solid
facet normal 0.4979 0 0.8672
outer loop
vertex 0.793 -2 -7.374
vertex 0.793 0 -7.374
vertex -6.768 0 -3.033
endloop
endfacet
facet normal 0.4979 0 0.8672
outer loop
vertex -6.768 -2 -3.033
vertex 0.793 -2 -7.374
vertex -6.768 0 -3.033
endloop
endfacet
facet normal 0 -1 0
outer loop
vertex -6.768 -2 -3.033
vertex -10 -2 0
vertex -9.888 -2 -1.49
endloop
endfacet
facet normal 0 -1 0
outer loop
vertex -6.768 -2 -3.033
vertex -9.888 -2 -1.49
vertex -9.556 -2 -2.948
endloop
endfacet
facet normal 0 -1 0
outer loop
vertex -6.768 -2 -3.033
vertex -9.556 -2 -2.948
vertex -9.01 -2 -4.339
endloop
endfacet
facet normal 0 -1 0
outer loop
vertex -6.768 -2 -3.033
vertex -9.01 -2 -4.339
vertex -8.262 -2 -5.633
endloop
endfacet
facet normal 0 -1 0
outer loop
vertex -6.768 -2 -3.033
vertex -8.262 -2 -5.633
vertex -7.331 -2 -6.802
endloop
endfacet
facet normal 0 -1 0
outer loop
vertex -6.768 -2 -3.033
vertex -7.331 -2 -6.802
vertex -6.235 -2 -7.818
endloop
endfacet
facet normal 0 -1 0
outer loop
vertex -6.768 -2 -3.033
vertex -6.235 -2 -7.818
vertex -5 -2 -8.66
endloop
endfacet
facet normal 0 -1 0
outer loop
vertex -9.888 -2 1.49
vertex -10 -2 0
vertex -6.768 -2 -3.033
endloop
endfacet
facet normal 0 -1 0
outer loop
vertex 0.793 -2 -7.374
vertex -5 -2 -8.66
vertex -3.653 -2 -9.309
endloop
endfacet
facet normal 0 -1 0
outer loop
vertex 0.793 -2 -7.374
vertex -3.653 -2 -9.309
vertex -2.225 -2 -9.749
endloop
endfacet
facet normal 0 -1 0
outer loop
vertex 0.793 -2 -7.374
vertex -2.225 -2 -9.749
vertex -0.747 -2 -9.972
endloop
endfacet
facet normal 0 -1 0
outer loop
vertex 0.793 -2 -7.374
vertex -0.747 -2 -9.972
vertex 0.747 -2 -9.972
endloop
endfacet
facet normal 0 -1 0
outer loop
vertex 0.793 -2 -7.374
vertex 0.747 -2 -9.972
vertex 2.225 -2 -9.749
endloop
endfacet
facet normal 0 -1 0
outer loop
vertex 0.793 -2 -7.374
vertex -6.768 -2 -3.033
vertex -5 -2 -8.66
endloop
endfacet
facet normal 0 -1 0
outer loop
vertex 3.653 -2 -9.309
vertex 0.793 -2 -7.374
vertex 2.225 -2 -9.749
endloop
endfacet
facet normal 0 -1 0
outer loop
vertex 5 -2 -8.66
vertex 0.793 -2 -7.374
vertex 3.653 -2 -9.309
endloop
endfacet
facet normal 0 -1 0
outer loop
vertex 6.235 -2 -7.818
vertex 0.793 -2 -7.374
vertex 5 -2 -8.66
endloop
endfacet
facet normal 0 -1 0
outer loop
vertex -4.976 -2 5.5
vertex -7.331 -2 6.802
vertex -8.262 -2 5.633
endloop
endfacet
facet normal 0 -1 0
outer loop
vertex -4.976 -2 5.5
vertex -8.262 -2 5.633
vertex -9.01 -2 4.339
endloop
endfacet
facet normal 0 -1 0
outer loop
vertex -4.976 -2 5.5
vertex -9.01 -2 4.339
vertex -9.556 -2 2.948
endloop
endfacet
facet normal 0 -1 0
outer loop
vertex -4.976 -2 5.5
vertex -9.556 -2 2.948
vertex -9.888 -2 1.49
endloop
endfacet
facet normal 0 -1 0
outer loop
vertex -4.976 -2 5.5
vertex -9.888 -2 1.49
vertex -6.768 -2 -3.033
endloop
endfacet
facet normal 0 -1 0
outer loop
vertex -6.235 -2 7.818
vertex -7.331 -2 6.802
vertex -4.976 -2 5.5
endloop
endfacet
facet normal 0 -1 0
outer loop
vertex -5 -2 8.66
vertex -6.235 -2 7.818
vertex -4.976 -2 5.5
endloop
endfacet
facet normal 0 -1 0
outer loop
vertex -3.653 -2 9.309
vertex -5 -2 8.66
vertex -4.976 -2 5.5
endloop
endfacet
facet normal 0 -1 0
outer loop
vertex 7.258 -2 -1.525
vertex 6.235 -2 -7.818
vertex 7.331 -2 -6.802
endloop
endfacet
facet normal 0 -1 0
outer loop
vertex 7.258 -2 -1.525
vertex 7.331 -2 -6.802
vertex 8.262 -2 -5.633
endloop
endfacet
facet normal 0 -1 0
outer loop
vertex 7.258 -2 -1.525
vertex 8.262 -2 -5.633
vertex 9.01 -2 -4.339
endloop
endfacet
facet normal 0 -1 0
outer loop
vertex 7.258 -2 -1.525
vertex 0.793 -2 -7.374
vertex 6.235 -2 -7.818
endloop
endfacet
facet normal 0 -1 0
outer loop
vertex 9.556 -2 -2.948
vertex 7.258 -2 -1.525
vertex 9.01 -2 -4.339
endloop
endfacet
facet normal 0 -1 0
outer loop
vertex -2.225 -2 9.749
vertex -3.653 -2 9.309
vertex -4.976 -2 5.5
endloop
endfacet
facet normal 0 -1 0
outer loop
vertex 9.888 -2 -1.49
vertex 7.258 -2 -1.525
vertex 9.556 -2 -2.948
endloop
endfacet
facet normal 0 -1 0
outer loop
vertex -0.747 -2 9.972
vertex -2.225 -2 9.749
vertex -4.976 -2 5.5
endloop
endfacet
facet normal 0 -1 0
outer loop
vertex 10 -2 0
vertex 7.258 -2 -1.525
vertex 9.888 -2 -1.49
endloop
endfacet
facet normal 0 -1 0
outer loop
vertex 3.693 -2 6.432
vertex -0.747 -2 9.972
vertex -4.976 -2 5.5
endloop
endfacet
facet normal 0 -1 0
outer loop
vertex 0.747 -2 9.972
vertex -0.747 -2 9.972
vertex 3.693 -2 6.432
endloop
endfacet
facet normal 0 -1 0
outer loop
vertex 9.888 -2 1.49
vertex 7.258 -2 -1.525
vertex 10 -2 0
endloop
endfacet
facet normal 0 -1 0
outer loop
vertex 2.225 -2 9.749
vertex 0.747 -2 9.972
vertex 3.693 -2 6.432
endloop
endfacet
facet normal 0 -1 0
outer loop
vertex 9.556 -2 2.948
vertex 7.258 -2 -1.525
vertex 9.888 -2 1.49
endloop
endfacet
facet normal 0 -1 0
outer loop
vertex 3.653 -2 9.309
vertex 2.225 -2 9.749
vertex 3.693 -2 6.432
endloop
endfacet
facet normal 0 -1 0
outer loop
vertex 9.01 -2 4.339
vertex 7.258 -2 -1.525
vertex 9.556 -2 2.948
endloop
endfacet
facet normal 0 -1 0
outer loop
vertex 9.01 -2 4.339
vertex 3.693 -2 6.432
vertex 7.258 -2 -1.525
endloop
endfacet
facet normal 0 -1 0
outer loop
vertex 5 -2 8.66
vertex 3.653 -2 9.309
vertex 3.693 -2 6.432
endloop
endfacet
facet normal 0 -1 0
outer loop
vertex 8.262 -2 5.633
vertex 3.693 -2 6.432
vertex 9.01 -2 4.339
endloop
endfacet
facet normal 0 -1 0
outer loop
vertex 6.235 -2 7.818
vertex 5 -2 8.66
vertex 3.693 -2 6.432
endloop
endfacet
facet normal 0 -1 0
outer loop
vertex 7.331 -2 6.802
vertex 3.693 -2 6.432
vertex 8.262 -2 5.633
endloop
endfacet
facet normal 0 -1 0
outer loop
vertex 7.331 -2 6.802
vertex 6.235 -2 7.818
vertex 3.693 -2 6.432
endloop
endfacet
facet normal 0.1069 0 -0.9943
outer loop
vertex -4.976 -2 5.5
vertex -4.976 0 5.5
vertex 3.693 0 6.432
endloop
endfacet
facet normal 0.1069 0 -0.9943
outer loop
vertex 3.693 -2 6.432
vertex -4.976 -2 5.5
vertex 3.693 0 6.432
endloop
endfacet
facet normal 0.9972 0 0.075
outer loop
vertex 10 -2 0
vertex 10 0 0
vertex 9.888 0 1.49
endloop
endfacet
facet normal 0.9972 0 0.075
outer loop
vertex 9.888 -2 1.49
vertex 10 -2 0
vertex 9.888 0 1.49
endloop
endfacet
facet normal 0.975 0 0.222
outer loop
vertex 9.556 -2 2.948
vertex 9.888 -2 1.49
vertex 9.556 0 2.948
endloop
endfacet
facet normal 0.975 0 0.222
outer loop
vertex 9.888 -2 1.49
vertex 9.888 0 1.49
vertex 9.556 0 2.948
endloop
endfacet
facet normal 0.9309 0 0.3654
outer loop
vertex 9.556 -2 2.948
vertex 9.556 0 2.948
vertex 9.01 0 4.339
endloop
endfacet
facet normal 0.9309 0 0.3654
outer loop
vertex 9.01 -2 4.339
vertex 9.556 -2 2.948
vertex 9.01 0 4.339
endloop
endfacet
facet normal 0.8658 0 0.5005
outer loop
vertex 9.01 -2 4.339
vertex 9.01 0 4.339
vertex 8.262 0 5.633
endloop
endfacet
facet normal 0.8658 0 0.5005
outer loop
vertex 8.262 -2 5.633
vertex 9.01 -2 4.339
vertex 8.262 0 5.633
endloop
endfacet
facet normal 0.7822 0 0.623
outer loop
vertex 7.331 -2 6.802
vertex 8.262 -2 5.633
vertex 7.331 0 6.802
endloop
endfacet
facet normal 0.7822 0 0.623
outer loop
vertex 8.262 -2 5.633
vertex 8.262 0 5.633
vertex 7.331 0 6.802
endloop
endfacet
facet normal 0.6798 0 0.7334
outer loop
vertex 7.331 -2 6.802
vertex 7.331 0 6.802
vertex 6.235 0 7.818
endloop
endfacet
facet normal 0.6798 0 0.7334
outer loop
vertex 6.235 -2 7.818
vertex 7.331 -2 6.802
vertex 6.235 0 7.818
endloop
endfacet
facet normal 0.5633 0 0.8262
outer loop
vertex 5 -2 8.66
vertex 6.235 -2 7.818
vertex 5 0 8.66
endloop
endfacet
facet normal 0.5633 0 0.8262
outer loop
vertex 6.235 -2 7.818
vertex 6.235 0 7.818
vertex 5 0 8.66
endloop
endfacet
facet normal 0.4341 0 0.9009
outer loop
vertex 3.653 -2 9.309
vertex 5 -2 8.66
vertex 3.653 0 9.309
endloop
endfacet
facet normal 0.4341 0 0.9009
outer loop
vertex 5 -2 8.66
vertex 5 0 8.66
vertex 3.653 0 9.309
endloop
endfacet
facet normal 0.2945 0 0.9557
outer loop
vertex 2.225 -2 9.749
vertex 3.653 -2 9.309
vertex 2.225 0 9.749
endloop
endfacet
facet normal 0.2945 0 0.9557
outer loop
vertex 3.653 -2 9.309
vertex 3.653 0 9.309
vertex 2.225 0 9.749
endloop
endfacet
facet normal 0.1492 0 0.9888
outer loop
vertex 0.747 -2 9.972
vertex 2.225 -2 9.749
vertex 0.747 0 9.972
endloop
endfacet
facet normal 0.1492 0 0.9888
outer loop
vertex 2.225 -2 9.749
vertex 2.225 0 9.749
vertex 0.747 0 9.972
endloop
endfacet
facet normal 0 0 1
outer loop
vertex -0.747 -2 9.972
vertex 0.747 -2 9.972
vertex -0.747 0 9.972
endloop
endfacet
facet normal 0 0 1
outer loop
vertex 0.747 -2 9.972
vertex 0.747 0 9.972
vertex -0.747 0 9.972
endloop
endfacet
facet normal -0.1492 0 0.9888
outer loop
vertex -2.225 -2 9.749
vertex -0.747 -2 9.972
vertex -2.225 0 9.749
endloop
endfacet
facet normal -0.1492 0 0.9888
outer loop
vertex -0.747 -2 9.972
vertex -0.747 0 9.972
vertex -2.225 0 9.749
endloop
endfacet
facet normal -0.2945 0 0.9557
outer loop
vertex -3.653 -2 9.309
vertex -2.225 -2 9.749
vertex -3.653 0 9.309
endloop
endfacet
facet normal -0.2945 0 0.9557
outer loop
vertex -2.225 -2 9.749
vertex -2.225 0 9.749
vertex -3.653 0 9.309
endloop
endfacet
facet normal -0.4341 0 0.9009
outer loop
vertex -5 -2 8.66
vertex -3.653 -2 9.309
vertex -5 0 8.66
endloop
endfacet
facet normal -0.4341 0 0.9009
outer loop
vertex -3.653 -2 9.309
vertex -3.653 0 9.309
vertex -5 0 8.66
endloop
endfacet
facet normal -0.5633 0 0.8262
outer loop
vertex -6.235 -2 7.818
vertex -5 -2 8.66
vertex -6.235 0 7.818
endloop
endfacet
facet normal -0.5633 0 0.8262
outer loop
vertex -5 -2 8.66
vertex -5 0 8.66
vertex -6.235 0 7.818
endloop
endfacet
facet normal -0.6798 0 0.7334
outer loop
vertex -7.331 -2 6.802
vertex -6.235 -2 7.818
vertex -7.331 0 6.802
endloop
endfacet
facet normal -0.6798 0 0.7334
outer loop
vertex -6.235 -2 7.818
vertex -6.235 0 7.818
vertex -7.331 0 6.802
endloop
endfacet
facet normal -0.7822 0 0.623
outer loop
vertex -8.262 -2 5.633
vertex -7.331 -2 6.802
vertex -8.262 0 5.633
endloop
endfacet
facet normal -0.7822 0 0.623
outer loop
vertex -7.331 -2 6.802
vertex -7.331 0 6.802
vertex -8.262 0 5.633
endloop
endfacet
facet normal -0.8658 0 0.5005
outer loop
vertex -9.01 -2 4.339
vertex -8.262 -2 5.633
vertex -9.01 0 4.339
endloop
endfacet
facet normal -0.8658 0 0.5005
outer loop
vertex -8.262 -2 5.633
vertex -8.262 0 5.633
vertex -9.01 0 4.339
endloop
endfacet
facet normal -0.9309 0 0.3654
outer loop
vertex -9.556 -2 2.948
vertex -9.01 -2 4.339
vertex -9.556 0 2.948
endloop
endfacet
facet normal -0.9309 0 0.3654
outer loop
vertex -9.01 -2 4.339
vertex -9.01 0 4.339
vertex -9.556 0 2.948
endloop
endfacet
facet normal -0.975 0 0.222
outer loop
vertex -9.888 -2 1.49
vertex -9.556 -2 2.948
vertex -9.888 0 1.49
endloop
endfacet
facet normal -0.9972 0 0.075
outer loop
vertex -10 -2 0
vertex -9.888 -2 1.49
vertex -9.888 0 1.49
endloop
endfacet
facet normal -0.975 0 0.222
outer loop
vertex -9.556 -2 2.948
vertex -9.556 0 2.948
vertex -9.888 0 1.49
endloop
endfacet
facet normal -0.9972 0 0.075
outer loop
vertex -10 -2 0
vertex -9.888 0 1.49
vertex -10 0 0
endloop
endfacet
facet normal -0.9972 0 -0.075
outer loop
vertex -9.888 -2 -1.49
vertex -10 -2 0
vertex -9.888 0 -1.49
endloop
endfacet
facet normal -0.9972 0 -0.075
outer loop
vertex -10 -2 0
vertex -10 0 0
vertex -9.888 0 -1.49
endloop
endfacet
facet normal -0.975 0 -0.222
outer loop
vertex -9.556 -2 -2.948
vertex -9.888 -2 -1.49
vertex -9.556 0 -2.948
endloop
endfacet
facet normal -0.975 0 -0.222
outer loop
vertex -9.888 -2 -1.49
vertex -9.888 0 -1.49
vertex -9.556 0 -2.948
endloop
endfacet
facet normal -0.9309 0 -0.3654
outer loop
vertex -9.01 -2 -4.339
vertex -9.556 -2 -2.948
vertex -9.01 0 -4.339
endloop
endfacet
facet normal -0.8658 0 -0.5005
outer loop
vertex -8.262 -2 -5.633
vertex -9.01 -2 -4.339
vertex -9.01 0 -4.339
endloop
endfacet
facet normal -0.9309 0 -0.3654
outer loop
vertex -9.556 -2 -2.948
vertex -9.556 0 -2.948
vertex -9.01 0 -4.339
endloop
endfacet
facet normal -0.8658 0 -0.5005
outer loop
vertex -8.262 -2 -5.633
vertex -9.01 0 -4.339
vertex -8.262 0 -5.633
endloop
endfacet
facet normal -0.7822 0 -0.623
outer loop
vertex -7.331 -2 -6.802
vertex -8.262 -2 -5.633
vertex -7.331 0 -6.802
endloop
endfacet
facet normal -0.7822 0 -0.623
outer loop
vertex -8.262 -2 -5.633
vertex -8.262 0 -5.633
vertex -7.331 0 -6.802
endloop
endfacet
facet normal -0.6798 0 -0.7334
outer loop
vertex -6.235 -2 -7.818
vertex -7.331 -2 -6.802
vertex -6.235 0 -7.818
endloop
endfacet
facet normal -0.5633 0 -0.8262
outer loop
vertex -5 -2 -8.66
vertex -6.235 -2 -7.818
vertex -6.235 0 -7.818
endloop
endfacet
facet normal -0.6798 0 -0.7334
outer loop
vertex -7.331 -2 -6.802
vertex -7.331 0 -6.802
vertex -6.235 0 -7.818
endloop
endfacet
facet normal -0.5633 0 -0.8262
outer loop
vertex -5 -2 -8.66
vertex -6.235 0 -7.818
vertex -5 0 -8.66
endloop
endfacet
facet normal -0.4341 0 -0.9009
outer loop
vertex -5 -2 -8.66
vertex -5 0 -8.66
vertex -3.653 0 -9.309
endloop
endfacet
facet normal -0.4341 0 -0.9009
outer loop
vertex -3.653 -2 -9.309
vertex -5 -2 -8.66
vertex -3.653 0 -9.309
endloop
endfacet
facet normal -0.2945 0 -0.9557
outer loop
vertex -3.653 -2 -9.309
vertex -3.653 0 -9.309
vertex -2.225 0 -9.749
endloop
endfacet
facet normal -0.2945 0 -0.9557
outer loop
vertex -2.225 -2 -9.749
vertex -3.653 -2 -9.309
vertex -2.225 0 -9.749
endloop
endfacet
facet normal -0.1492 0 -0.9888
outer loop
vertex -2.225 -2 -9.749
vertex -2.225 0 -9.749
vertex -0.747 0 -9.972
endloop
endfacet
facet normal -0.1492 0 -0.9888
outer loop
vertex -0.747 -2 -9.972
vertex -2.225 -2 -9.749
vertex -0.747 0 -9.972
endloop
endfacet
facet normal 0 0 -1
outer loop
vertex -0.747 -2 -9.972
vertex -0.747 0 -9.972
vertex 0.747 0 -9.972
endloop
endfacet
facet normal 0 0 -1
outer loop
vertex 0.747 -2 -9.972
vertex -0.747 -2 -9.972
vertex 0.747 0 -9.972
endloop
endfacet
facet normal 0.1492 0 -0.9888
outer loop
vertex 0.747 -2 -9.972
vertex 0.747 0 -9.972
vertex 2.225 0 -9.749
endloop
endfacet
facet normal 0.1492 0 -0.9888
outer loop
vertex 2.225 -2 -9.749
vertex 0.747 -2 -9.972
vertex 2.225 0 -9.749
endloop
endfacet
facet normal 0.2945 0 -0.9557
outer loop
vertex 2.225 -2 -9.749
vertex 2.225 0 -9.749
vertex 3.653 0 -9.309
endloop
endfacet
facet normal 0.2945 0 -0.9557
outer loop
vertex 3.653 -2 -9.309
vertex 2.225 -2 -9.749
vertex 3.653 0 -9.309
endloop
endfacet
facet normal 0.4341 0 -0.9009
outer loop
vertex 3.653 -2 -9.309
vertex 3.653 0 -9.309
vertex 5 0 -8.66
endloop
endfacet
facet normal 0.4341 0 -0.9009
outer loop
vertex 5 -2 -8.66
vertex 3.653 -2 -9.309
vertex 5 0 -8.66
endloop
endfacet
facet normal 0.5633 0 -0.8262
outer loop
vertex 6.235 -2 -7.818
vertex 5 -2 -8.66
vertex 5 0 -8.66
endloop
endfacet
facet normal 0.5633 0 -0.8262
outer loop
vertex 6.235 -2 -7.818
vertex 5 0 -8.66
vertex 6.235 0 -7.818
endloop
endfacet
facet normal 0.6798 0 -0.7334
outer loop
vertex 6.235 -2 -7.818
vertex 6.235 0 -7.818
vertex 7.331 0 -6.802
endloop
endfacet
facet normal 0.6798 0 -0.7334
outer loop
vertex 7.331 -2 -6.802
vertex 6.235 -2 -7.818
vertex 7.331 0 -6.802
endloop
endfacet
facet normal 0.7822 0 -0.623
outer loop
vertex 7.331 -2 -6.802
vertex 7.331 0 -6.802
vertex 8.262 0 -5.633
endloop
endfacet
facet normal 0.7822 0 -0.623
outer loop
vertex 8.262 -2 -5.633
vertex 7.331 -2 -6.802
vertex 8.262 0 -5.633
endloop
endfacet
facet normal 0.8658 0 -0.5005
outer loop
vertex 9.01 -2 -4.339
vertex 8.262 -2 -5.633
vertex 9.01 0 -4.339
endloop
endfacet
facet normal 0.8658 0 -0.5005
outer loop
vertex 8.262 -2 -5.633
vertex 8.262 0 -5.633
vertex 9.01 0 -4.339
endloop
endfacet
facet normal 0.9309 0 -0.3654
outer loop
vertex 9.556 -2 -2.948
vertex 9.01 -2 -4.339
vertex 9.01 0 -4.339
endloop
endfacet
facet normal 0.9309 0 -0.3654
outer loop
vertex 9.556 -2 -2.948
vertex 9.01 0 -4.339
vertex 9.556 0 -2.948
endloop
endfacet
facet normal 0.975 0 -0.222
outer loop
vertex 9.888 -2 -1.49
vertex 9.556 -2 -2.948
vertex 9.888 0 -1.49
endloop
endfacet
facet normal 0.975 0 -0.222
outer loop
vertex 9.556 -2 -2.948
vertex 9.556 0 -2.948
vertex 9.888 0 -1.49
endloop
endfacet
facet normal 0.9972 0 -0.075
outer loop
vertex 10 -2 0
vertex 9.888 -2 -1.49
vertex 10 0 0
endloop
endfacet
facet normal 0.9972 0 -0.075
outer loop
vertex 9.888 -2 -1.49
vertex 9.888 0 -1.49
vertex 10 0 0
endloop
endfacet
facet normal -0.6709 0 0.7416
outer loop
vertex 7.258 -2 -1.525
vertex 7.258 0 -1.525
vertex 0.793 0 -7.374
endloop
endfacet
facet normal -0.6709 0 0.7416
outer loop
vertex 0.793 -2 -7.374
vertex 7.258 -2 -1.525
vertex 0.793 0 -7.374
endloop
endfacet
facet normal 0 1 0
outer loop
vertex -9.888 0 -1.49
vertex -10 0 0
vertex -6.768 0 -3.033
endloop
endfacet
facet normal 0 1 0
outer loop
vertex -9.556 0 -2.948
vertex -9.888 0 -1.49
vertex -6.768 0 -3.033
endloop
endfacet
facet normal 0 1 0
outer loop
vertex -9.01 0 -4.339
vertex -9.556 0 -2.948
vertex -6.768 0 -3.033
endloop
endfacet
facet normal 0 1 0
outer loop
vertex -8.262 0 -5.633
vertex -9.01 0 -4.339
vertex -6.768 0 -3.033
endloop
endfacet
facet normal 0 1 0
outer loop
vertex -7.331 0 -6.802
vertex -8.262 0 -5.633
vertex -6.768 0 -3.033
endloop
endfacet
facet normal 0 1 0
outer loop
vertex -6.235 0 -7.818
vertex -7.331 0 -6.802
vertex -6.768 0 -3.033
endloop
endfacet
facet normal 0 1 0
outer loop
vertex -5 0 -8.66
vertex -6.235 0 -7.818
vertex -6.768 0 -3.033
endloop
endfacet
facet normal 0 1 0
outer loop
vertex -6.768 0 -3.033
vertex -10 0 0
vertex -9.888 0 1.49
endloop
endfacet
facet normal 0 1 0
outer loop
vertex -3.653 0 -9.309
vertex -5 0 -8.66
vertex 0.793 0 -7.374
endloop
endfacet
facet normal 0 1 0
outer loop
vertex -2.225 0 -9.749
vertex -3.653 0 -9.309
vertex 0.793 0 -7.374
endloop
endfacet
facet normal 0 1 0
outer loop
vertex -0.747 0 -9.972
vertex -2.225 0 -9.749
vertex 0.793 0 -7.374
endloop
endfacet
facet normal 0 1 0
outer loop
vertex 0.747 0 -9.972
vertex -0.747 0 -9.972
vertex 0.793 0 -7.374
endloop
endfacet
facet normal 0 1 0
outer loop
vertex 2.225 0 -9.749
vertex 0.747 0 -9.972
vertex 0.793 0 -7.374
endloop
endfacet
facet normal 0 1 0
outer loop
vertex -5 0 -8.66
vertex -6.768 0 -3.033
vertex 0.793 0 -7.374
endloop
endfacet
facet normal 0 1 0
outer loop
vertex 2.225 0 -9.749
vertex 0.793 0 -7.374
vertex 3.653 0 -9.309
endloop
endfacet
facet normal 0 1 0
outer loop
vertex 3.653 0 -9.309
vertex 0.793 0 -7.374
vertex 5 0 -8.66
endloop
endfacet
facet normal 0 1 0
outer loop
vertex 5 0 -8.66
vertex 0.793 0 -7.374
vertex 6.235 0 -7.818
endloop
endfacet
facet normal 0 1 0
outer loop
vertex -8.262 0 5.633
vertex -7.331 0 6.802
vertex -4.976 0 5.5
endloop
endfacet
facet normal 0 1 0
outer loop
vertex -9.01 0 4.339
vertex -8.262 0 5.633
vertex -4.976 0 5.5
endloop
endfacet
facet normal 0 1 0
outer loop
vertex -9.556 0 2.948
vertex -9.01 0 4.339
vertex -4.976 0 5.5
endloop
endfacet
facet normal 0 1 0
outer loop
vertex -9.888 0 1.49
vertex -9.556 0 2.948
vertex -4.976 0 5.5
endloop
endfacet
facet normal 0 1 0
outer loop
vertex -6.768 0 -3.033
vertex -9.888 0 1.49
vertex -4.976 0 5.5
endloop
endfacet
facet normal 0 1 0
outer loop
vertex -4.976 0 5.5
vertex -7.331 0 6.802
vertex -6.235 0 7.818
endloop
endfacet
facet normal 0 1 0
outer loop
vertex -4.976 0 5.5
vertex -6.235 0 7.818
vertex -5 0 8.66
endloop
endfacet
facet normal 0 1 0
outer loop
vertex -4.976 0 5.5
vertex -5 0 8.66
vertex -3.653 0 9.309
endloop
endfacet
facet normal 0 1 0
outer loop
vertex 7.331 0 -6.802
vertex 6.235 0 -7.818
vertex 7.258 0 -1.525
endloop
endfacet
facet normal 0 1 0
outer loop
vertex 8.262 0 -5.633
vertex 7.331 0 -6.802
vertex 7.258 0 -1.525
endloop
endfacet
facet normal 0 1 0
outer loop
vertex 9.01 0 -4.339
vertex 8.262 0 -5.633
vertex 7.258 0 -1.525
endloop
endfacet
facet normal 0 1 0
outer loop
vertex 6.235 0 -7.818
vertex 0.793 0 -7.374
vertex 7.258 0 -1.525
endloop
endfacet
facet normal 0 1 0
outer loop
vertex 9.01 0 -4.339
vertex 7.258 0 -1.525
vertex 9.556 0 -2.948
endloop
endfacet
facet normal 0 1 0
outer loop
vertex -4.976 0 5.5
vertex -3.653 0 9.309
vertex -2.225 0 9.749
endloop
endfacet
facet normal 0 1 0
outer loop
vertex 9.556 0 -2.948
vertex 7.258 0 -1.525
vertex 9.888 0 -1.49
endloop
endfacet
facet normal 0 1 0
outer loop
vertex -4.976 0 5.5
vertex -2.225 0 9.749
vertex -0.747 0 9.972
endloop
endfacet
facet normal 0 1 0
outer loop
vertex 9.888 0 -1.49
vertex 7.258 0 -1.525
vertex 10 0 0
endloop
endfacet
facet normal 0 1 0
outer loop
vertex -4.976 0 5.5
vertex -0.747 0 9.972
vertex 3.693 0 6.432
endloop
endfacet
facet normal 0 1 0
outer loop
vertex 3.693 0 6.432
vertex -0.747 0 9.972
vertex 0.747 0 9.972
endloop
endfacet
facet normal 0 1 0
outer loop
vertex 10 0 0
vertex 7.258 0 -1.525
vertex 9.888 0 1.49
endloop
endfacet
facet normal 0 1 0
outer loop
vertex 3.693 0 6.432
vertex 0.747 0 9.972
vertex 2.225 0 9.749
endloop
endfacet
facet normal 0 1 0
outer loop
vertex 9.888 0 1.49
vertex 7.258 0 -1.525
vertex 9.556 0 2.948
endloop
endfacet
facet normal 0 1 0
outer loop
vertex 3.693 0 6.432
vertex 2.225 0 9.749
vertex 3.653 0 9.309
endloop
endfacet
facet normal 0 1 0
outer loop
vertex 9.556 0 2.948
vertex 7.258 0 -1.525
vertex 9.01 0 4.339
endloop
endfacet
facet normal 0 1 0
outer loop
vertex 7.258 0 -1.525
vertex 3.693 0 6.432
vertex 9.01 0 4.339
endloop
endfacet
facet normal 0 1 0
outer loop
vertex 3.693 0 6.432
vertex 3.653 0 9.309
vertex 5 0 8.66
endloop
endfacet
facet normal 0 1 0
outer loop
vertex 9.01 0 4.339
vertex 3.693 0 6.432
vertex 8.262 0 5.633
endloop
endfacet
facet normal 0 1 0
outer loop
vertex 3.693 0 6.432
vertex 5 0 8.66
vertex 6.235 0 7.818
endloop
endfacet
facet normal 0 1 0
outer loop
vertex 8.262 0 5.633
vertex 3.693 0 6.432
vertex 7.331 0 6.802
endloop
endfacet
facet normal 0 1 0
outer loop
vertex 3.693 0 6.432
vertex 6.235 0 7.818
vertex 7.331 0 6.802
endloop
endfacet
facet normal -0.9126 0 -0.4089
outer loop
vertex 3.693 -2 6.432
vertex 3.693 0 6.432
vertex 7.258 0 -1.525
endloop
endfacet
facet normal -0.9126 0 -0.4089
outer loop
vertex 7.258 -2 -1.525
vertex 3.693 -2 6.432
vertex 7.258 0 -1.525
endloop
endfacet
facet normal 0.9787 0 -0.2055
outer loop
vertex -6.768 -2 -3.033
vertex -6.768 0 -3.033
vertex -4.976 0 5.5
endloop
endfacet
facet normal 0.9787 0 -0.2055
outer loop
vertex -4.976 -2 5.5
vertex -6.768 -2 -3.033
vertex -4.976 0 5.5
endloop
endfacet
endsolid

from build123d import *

# Parameters (mm, degrees)
F0_R     = 10
F1_DEPTH = 2


with BuildPart() as f1:
    # F0 (on Front) → F1 (new body)
    with BuildSketch(Plane.XZ):
        Circle(F0_R)
        Polygon((3.692769, 6.431684), (7.258024, -1.524532), (0.792936, -7.373897), (-6.767962, -3.032787), (-4.975767, 5.499532), align=None, mode=Mode.SUBTRACT)
    extrude(amount=F1_DEPTH)


solid = f1.part
